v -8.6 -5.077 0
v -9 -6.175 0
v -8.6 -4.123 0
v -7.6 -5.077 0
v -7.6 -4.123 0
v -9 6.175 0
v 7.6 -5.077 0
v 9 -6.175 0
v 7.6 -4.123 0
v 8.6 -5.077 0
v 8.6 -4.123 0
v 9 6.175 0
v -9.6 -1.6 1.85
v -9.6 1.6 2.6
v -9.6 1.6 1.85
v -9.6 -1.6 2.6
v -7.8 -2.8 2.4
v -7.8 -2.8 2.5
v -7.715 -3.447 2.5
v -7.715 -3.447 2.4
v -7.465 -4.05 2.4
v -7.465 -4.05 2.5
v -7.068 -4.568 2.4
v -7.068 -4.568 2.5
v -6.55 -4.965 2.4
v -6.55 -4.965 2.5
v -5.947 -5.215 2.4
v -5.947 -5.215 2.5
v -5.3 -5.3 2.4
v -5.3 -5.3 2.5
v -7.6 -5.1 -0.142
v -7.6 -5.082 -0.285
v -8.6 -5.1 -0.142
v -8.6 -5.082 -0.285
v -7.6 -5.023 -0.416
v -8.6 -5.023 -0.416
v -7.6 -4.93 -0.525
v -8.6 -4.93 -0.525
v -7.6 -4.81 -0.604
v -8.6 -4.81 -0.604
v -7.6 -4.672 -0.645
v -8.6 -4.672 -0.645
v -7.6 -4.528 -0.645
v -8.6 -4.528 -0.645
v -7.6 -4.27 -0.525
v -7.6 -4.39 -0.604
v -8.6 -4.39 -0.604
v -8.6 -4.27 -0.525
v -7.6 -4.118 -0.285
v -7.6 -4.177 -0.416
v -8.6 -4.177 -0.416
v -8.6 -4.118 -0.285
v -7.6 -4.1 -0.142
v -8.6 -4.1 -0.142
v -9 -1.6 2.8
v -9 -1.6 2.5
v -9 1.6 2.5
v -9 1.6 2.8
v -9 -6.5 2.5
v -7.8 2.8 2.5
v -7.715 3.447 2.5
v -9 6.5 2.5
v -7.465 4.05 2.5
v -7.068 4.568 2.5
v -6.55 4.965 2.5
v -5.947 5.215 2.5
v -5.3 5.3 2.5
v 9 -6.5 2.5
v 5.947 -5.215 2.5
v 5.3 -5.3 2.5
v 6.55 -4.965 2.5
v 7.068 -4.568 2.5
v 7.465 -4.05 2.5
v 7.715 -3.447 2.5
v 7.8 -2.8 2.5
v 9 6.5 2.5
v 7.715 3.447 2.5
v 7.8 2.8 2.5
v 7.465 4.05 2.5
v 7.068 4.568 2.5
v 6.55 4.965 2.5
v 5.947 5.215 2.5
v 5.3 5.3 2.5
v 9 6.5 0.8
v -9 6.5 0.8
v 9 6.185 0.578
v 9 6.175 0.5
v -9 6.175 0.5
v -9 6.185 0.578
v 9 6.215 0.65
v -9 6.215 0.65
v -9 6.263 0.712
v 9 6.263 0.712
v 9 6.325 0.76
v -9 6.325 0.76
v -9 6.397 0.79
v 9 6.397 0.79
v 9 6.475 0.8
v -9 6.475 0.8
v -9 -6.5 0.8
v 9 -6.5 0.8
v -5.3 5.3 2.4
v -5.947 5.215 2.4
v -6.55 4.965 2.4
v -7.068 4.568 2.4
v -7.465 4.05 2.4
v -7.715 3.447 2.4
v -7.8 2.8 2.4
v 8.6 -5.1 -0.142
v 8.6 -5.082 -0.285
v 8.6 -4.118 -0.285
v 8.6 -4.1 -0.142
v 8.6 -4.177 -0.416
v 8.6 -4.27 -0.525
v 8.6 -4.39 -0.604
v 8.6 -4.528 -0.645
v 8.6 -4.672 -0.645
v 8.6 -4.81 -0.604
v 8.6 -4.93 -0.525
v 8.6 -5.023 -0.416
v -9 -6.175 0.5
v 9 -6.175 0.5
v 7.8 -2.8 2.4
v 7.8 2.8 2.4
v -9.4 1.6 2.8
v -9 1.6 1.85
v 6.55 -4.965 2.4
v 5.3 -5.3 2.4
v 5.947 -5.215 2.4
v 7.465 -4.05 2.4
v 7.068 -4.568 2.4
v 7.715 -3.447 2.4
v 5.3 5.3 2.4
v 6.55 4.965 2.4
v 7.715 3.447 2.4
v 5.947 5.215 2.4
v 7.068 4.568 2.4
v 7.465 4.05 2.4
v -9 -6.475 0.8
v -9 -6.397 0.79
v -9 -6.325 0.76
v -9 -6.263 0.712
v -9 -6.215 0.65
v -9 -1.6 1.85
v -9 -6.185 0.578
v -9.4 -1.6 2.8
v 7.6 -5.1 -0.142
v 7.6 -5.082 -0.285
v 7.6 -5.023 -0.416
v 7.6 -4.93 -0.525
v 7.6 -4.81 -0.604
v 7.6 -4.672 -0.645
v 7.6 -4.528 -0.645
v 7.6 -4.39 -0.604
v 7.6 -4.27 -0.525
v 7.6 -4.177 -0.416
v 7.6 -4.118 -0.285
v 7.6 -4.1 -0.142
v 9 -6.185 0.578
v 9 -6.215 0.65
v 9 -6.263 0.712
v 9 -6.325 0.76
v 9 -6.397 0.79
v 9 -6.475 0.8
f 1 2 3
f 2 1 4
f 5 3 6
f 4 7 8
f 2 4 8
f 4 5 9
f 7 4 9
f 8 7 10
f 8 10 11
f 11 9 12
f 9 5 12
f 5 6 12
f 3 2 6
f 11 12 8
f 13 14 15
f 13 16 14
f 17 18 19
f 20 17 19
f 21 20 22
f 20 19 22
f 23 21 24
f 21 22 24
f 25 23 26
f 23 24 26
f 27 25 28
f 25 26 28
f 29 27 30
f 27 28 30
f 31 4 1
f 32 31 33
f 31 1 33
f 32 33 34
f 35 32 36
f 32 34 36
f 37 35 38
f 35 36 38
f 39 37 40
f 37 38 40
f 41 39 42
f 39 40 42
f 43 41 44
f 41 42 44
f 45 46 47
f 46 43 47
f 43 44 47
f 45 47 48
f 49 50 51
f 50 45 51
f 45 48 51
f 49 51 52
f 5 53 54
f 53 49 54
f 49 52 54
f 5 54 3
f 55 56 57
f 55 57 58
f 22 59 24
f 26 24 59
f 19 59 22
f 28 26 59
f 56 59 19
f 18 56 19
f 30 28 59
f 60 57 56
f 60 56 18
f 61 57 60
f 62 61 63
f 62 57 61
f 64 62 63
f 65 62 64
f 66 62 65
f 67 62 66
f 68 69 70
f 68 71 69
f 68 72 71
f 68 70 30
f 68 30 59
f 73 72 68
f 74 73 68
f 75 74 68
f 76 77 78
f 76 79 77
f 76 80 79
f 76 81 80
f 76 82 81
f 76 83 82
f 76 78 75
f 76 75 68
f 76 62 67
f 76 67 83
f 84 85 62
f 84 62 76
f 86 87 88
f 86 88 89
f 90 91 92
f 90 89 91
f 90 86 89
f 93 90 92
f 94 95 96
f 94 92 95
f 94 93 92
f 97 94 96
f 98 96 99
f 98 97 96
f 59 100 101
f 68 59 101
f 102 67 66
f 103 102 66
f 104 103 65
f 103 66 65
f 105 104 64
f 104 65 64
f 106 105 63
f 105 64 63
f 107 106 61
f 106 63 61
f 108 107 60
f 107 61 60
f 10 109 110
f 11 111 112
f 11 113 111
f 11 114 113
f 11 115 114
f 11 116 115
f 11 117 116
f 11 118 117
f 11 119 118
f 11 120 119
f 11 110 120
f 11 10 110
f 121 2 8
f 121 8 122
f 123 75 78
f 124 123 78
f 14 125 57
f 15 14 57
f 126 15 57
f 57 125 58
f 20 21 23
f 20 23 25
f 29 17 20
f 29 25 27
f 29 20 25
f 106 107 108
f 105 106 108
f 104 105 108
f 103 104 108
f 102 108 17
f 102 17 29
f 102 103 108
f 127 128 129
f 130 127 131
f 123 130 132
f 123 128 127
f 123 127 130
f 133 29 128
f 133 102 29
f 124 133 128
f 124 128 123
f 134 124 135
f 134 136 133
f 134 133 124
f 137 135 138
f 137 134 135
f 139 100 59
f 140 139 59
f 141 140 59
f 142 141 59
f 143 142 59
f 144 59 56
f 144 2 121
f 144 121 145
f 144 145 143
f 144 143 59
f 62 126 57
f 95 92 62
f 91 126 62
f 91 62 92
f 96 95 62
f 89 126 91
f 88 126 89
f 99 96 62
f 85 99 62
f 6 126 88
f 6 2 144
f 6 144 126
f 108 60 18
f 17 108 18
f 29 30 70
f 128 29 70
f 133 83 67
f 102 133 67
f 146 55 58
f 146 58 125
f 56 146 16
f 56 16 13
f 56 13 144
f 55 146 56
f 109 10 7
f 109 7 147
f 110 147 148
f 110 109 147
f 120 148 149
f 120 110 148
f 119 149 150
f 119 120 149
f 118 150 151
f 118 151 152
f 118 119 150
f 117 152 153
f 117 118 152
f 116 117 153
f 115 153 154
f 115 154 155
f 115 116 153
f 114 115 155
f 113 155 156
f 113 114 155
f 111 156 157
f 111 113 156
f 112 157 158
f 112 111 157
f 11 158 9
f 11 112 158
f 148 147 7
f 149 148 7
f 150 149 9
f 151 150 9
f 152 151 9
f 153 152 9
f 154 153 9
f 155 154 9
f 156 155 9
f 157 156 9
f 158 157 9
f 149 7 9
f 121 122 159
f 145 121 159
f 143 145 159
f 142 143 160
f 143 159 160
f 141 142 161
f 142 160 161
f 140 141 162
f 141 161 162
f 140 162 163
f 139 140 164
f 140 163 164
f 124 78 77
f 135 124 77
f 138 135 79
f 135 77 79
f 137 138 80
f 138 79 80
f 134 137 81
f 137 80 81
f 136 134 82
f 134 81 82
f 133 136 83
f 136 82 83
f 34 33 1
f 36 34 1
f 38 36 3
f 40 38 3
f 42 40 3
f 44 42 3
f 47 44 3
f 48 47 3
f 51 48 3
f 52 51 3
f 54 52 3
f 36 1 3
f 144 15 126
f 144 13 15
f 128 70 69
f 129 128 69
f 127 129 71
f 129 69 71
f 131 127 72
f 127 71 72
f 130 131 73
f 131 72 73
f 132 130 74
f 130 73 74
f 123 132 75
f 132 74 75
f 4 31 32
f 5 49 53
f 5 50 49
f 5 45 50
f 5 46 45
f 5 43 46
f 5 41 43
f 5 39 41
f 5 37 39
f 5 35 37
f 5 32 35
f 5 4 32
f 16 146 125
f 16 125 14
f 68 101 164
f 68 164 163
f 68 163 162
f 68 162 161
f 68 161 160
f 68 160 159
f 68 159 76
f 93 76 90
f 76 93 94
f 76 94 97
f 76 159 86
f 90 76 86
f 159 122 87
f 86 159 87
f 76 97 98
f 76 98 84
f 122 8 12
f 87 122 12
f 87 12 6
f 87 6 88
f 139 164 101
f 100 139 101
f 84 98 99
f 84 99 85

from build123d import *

# Parameters (mm, degrees)
F0_W          = 18
F0_H          = 13
F1_DEPTH      = 2.5
F3_DEPTH      = 0.1
F5_R          = 0.5
F6_DEPTH      = 0.5
F8_DEPTH      = 9.001
F8_DEPTH_BACK = 9.001
F10_DEPTH     = 1.6


# Not quite as in the source:
# - a pattern or mirror of a feature is missing from the dataset's text; its kind, count and spacing are read off the source's solid


with BuildPart() as f1:
    # F0 (on Top) → F1 (new body)
    with BuildSketch(Plane.XY):
        Rectangle(F0_W, F0_H)
    extrude(amount=F1_DEPTH)

    # F2 (on face) → F3 (cut)
    with BuildSketch(Plane.XY.offset(2.5)):
        with BuildLine():
            ThreePointArc((7.8, 2.8), (7.067766953, 4.567766953), (5.3, 5.3))
            Line((5.3, 5.3), (-5.3, 5.3))
            ThreePointArc((-5.3, 5.3), (-7.067766953, 4.567766953), (-7.8, 2.8))
            Line((-7.8, 2.8), (-7.8, -2.8))
            ThreePointArc((-7.8, -2.8), (-7.067766953, -4.567766953), (-5.3, -5.3))
            Line((-5.3, -5.3), (5.3, -5.3))
            ThreePointArc((5.3, -5.3), (7.067766953, -4.567766953), (7.8, -2.8))
            Line((7.8, -2.8), (7.8, 2.8))
        make_face()
    extrude(amount=-F3_DEPTH, mode=Mode.SUBTRACT)

    # F5 (on offset) → F6 (join, symmetric)
    with BuildSketch(Plane.YZ.offset(8.1)):
        with Locations((-4.6, -0.15)):
            Circle(F5_R)
    f6 = extrude(amount=F6_DEPTH, both=True)

    # F6_copies: F6 across plane
    add(f6.mirror(Plane(origin=(0, 0, 0), x_dir=(0, 0, -1), z_dir=(-1, 0, 0))))

    # F7 (on Right) → F8 (cut, two sides)
    with BuildSketch(Plane.YZ) as f8_sk:
        with BuildLine():
            Line((-6.5, 0.8), (-6.5, 0))
            Line((-6.5, 0), (-6.175, 0))
            Line((-6.175, 0), (-6.175, 0.5))
            ThreePointArc((-6.175, 0.5), (-6.2628679656, 0.7121320344), (-6.475, 0.8))
            Line((-6.475, 0.8), (-6.5, 0.8))
        make_face()
    f8 = extrude(amount=-F8_DEPTH, mode=Mode.SUBTRACT) + extrude(f8_sk.sketch, amount=F8_DEPTH_BACK, mode=Mode.SUBTRACT)

    # F8_copies: F8 across plane
    add(f8.mirror(Plane.ZX), mode=Mode.SUBTRACT)

    # F9 (on Front) → F10 (join, symmetric)
    with BuildSketch(Plane.XZ):
        Polygon((-9, 1.85), (-9, 2.8), (-9.4, 2.8), (-9.6, 2.6), (-9.6, 1.85), align=None)
    extrude(amount=F10_DEPTH, both=True)


solid = f1.part
